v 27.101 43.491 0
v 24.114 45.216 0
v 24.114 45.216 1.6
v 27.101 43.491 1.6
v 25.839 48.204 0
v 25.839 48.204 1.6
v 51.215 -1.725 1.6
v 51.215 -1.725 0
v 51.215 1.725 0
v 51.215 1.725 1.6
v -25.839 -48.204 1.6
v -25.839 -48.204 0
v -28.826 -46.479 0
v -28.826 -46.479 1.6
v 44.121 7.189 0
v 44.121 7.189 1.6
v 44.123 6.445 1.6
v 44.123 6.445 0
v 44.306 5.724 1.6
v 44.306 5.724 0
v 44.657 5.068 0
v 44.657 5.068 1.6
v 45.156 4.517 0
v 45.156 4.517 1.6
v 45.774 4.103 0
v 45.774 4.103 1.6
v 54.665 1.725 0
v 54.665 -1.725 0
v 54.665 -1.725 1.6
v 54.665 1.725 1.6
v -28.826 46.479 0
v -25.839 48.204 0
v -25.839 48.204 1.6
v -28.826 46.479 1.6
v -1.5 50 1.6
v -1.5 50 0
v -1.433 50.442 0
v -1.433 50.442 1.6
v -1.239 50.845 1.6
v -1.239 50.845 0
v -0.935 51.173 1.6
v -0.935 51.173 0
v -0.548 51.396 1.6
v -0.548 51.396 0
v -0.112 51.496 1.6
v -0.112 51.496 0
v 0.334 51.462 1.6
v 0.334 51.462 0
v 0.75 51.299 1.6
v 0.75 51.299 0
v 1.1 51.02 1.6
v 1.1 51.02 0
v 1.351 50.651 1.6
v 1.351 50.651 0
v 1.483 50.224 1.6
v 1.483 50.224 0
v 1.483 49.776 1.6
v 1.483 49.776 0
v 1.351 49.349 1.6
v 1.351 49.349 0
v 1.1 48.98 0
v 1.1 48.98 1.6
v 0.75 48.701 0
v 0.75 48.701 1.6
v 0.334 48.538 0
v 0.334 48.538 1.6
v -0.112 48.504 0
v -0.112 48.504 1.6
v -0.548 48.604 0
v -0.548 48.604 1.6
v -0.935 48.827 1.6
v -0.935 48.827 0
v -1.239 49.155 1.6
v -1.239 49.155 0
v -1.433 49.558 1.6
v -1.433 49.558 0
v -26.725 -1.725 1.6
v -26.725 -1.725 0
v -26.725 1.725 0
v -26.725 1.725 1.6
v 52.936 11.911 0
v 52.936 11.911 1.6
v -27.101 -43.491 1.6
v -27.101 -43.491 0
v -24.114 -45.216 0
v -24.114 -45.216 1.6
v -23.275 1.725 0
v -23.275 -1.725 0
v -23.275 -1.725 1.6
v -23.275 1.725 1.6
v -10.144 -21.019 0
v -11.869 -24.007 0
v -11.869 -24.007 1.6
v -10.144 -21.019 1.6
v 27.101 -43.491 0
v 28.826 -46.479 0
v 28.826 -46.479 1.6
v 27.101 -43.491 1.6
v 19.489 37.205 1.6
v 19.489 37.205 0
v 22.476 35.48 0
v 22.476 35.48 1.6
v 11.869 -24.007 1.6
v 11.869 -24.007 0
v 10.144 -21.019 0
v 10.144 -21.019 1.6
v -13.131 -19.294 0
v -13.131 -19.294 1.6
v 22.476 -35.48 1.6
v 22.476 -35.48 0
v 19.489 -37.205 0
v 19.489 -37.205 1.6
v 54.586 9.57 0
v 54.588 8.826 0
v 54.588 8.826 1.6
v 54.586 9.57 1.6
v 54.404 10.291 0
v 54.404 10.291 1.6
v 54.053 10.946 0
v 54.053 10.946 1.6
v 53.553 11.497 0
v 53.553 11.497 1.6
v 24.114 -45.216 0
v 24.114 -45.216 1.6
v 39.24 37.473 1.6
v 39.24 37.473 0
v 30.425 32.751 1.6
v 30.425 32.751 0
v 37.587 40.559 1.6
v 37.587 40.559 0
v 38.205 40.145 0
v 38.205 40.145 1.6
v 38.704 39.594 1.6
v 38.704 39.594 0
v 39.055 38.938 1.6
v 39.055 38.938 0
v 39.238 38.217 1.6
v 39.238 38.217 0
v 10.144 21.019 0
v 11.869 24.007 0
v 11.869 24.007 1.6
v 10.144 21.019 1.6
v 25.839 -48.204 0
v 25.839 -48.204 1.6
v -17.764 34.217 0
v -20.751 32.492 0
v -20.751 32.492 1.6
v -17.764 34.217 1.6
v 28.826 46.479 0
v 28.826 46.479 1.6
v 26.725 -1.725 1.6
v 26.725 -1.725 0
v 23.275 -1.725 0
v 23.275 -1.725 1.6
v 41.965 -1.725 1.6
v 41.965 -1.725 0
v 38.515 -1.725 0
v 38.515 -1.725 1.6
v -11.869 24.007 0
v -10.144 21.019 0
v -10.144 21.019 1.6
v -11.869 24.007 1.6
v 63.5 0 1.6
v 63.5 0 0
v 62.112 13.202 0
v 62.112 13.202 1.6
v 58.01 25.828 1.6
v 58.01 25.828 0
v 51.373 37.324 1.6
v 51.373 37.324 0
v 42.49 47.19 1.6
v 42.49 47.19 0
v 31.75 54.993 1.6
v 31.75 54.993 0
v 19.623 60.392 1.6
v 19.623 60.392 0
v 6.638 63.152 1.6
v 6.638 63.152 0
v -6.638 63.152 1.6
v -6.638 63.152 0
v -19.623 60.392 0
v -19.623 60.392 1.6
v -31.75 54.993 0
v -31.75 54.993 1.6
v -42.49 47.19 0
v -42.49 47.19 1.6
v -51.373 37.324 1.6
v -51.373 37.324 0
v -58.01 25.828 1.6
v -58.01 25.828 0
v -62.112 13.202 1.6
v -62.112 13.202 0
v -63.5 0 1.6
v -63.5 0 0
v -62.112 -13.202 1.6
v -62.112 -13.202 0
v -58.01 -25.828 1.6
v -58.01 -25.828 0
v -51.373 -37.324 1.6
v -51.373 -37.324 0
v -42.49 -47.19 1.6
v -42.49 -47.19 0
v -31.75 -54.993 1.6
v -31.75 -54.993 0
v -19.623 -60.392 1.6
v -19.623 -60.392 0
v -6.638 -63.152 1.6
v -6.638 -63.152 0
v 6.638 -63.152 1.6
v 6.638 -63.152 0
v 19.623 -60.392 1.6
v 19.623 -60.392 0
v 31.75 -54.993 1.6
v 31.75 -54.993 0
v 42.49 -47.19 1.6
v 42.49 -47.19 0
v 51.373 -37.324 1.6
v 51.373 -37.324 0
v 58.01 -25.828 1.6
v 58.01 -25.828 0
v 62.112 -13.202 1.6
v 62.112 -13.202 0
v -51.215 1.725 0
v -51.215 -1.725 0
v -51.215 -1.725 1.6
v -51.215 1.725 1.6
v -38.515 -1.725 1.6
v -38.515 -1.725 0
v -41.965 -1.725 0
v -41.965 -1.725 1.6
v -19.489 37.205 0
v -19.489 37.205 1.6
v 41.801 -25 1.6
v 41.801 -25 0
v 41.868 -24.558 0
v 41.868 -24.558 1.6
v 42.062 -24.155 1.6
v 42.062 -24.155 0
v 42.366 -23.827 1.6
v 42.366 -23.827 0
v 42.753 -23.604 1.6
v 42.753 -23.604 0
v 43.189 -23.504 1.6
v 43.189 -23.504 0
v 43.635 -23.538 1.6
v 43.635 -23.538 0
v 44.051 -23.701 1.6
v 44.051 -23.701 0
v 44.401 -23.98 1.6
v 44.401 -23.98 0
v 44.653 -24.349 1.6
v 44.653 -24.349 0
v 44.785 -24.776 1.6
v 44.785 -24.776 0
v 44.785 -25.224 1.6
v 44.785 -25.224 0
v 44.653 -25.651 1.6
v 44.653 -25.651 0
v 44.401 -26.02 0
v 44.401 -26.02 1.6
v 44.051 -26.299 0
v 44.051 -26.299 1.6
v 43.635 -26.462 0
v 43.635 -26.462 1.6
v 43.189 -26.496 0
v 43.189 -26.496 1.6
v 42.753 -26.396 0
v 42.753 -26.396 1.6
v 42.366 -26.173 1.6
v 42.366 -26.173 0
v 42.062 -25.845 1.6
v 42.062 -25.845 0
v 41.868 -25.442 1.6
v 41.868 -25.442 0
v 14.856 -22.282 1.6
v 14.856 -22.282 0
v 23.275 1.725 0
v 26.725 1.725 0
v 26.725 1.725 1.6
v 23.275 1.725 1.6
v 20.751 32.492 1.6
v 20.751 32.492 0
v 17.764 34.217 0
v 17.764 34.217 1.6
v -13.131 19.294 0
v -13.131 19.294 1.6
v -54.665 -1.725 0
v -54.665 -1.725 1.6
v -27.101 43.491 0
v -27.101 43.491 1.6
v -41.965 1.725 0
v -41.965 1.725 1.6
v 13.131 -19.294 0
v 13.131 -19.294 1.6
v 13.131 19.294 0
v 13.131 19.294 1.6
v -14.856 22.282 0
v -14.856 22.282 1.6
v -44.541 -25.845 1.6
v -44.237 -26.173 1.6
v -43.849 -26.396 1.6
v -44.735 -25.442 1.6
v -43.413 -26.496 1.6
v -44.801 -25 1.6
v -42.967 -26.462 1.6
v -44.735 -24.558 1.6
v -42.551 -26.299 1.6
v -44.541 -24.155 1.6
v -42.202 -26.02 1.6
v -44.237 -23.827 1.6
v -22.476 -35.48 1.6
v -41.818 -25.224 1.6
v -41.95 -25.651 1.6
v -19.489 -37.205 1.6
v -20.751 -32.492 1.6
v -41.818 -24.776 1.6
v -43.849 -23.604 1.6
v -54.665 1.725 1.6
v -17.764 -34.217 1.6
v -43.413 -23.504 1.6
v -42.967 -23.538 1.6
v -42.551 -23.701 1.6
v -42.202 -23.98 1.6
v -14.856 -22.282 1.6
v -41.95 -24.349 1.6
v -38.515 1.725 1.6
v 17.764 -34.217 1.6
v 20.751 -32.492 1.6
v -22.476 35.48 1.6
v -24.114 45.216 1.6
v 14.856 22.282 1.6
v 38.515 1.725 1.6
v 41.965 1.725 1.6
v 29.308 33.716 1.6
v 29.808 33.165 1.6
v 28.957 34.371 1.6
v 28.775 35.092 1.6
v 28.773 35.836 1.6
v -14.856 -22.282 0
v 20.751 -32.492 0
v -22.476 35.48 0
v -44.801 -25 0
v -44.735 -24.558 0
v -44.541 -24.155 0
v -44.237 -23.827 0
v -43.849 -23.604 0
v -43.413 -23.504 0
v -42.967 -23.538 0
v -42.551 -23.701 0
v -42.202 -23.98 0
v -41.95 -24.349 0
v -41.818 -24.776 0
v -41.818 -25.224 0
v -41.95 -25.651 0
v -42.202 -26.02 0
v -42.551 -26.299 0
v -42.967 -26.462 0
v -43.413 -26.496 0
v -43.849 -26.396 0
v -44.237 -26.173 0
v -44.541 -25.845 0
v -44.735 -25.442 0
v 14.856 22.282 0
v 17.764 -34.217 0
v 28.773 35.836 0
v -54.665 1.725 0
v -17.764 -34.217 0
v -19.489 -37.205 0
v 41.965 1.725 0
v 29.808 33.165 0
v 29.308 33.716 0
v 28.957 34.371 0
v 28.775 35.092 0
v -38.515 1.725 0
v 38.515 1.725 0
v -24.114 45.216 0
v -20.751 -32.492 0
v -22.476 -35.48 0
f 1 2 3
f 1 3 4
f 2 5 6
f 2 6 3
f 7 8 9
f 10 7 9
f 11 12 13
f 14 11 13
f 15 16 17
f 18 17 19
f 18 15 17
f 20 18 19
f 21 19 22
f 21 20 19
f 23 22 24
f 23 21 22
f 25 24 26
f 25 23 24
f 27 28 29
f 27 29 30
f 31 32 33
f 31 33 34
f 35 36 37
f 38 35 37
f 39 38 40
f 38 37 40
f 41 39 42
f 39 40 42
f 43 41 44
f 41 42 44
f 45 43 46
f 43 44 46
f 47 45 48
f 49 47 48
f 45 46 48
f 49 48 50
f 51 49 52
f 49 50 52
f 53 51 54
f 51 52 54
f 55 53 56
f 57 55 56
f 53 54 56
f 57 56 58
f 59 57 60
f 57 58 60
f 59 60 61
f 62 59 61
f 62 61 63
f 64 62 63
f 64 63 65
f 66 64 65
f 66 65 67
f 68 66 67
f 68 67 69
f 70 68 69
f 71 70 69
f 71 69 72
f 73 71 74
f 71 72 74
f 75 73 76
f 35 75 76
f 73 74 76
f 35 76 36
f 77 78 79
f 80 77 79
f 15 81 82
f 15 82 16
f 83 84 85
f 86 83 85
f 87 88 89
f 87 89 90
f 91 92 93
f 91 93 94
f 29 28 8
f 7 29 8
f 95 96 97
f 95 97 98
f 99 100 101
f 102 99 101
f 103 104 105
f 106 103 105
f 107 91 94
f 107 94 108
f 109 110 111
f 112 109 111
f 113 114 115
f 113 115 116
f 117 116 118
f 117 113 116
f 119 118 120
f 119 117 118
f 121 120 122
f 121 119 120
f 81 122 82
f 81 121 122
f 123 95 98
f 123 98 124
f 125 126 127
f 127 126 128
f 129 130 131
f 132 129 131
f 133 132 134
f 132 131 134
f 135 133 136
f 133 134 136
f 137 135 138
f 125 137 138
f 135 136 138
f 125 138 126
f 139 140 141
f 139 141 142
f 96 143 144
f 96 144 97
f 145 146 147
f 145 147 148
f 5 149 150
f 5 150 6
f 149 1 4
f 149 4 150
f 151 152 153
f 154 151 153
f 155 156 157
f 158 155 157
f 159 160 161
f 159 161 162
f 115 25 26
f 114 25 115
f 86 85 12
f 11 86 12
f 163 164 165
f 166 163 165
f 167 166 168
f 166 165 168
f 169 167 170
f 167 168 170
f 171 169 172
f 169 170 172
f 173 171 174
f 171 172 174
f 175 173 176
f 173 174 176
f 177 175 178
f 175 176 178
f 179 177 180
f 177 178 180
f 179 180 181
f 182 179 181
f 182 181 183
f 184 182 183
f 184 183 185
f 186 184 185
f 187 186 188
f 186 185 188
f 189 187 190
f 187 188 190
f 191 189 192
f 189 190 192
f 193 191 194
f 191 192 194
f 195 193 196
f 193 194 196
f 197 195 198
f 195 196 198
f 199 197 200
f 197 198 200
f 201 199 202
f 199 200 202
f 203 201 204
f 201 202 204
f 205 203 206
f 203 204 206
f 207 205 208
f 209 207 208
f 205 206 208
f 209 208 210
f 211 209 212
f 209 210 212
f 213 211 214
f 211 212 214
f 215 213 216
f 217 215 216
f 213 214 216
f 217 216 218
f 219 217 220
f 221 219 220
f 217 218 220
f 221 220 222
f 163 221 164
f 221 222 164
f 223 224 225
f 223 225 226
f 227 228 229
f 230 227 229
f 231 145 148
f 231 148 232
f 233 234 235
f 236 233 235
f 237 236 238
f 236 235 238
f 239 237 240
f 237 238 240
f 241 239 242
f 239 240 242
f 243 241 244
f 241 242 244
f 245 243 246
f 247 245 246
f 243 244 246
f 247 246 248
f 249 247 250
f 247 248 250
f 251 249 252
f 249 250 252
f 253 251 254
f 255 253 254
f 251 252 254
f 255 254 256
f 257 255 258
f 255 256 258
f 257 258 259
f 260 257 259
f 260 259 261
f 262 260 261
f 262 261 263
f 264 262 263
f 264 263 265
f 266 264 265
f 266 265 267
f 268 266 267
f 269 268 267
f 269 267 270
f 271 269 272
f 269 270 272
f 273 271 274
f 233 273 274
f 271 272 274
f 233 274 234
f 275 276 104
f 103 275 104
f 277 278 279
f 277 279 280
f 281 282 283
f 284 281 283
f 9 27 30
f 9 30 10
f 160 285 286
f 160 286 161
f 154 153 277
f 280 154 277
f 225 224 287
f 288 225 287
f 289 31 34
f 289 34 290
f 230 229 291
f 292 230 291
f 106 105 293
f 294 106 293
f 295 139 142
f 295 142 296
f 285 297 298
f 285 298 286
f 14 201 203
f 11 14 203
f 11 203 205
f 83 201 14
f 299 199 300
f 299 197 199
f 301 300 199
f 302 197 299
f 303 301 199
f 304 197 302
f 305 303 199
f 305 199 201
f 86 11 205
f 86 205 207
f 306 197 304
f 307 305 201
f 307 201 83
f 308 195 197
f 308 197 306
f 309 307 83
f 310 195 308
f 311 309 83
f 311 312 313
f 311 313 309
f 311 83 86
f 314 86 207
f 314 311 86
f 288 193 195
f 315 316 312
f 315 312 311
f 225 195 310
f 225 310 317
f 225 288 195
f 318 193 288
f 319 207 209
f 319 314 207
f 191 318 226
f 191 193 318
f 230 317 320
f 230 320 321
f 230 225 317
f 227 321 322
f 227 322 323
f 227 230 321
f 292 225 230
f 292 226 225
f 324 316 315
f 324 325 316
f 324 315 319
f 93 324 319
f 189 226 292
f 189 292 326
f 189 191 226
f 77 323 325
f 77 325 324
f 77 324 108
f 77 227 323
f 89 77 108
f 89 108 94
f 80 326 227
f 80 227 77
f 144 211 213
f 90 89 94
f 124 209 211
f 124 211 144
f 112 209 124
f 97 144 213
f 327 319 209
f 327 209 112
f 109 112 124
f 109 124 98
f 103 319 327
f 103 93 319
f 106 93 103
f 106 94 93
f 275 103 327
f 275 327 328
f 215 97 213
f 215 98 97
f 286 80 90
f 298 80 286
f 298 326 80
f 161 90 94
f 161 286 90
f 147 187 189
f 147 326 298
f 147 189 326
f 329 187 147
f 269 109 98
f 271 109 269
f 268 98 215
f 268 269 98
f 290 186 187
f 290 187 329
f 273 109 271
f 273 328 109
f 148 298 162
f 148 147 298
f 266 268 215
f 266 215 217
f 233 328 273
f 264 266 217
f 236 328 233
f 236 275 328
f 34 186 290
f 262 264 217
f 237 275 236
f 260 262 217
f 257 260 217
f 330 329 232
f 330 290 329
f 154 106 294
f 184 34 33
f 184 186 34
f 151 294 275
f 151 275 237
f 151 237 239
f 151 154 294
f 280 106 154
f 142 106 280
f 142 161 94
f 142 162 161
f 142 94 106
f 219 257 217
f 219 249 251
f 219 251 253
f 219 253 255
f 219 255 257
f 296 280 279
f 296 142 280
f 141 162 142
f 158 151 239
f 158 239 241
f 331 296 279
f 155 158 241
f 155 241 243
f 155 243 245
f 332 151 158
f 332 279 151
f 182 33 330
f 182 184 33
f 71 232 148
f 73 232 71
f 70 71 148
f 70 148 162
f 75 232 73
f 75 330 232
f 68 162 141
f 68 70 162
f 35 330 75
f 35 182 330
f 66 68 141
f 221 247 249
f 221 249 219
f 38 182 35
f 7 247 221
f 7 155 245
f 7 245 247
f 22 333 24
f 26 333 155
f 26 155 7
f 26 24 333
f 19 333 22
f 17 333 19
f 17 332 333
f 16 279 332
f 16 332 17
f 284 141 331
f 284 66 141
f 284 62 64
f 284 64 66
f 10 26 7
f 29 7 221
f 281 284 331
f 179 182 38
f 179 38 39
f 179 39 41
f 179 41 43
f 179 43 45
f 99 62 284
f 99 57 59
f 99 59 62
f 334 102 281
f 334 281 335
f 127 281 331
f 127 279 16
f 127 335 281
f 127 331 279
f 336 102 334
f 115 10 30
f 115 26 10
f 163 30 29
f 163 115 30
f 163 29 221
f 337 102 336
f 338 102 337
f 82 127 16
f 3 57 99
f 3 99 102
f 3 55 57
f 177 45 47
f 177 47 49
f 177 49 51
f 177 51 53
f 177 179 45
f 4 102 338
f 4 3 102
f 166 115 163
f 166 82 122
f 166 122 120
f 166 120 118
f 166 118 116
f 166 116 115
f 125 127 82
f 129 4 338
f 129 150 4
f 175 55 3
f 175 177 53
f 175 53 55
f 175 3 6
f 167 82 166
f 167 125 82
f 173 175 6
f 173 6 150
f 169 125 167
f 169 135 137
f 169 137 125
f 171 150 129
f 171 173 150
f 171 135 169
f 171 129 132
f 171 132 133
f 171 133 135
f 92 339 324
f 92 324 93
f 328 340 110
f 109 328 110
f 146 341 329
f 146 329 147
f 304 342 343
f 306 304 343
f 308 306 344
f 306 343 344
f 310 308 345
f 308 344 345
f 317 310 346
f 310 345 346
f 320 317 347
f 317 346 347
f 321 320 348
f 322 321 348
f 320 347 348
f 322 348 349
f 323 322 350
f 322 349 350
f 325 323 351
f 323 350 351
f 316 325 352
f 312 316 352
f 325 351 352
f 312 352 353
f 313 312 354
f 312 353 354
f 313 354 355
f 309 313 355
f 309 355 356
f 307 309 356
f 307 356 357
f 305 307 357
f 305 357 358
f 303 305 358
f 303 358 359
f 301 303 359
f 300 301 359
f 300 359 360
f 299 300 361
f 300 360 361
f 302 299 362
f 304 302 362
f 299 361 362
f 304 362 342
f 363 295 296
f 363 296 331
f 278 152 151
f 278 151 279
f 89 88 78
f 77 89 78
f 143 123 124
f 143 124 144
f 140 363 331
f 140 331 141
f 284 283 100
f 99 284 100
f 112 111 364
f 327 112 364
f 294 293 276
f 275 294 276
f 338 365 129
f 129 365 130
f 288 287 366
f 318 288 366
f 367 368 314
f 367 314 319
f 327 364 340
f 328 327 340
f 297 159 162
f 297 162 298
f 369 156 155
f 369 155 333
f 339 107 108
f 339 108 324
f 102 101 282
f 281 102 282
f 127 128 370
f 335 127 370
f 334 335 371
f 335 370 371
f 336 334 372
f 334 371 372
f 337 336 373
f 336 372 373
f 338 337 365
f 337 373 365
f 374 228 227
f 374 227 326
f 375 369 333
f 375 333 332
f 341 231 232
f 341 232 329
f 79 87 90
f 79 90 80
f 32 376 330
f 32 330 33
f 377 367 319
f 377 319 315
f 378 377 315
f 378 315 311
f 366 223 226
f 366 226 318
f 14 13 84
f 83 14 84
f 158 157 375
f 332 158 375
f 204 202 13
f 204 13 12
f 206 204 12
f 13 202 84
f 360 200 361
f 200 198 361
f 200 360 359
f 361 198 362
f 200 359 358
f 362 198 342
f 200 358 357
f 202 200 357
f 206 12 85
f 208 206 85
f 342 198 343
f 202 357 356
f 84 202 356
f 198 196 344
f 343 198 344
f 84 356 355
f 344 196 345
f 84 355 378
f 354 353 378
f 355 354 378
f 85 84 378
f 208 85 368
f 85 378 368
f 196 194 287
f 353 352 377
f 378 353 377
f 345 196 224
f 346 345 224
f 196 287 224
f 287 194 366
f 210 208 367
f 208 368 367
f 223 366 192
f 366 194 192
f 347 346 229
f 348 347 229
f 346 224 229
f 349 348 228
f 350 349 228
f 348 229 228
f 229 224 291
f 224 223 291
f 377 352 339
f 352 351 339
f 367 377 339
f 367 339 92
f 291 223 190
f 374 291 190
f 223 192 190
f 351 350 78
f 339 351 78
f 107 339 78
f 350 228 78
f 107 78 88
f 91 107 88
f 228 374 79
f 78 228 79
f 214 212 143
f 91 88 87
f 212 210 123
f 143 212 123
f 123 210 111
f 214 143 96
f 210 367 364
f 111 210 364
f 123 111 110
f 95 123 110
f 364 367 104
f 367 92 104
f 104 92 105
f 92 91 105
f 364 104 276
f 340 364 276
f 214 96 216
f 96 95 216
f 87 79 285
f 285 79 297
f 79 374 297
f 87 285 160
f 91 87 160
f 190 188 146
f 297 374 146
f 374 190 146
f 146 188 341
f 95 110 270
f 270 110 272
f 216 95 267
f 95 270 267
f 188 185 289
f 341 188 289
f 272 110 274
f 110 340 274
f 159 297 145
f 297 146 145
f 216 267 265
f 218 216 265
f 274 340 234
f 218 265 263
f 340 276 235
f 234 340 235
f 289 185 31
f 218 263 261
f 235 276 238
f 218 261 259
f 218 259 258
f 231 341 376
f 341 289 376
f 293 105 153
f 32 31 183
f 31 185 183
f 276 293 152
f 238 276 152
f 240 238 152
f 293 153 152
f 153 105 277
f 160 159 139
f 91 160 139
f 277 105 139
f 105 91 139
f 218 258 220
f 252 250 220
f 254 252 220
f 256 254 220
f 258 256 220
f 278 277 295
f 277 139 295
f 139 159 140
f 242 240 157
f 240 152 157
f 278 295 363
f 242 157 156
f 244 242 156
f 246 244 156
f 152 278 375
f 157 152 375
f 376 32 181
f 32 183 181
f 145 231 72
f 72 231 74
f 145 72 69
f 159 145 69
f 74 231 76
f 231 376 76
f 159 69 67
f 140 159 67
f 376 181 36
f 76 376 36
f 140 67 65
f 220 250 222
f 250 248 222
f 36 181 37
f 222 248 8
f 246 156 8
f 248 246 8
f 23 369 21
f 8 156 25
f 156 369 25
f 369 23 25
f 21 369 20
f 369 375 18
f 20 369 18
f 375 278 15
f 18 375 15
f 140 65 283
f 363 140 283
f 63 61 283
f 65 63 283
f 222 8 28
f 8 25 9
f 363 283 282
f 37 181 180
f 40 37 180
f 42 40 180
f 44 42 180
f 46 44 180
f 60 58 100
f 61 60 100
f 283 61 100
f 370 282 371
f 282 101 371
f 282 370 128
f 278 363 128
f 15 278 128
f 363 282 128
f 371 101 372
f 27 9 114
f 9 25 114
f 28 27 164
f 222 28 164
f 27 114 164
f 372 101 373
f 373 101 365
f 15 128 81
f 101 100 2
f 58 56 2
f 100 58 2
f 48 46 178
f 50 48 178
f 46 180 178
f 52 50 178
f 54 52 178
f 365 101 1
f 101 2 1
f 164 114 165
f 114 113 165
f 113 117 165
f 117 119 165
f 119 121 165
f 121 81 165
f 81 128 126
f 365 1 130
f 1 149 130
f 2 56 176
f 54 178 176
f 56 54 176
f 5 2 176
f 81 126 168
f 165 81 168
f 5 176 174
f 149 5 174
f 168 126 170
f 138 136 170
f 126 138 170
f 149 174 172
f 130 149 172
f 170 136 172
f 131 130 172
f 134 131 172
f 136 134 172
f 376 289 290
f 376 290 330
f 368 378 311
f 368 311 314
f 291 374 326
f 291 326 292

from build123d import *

# Parameters (mm, degrees)
SKETCH1_R           = 63.5
BOSS_EXTRUDE1_DEPTH = 1.6
SKETCH3_R           = 1.75
CUT_EXTRUDE4_DEPTH  = 1.6
SKETCH2_R           = 1.5
CUT_EXTRUDE5_DEPTH  = 1.6
CUT_EXTRUDE6_DEPTH  = 10
SKETCH5_W           = 3.45
SKETCH5_H           = 3.45
CUT_EXTRUDE7_DEPTH  = 10


with BuildPart() as part:
    # Sketch1 → Boss-Extrude1 (new body)
    with BuildSketch(Plane.XY):
        Circle(SKETCH1_R)
    extrude(amount=BOSS_EXTRUDE1_DEPTH)

    # Sketch3 → Cut-Extrude4 (cut)
    with BuildSketch(Plane(origin=(0, 0, 0), x_dir=(-1, 0, 0), z_dir=(0, 0, -1))):
        with Locations((-34.006305458, 36.654756705)):
            Circle(SKETCH3_R)
        with Locations((-49.354669589, 8.007283544)):
            Circle(SKETCH3_R)
    extrude(amount=-CUT_EXTRUDE4_DEPTH, mode=Mode.SUBTRACT)

    # Sketch2 → Cut-Extrude5 (cut)
    with BuildSketch(Plane(origin=(0, 0, 0), x_dir=(-1, 0, 0), z_dir=(0, 0, -1))):
        with Locations((0, 50)):
            Circle(SKETCH2_R)
        with Locations((43.301270189, -25)):
            Circle(SKETCH2_R)
        with Locations((-43.301270189, -25)):
            Circle(SKETCH2_R)
    extrude(amount=-CUT_EXTRUDE5_DEPTH, mode=Mode.SUBTRACT)

    # Sketch4 → Cut-Extrude6 (cut)
    with BuildSketch(Plane(origin=(0, 0, 0), x_dir=(-1, 0, 0), z_dir=(0, 0, -1))):
        with BuildLine():
            Line((-52.935522776, 11.911126581), (-44.12091565, 7.188553002))
            ThreePointArc((-44.12091565, 7.188553002), (-44.461118004, 5.385481223), (-45.773816402, 4.103440508))
            Line((-45.773816402, 4.103440508), (-54.588423529, 8.826014086))
            ThreePointArc((-54.588423529, 8.826014086), (-54.248221174, 10.629085865), (-52.935522776, 11.911126581))
        make_face()
        with BuildLine():
            Line((-39.240059397, 37.473487247), (-30.425452271, 32.750913668))
            ThreePointArc((-30.425452271, 32.750913668), (-29.112753873, 34.032954384), (-28.772551518, 35.836026163))
            Line((-28.772551518, 35.836026163), (-37.587158645, 40.558599742))
            ThreePointArc((-37.587158645, 40.558599742), (-38.899857043, 39.276559026), (-39.240059397, 37.473487247))
        make_face()
    extrude(amount=-CUT_EXTRUDE6_DEPTH, mode=Mode.SUBTRACT)

    # Sketch5 → Cut-Extrude7 (cut)
    with BuildSketch(Plane(origin=(0, 0, 0), x_dir=(-1, 0, 0), z_dir=(0, 0, -1))):
        with Locations((-52.94, 0)):
            Rectangle(SKETCH5_W, SKETCH5_H)
        Polygon((-24.113606178, -45.215991055), (-25.838606178, -48.203778698), (-28.826393822, -46.478778698), (-27.101393822, -43.490991055), align=None)
        Polygon((-27.101393822, 43.490991055), (-28.826393822, 46.478778698), (-25.838606178, 48.203778698), (-24.113606178, 45.215991055), align=None)
        with Locations((-40.24, 0)):
            Rectangle(SKETCH5_W, SKETCH5_H)
        with Locations((-25, 0)):
            Rectangle(SKETCH5_W, SKETCH5_H)
        with Locations((25, 0)):
            Rectangle(SKETCH5_W, SKETCH5_H)
        with Locations((40.24, 0)):
            Rectangle(SKETCH5_W, SKETCH5_H)
        with Locations((52.94, 0)):
            Rectangle(SKETCH5_W, SKETCH5_H)
        Polygon((13.131393822, -19.294241273), (14.856393822, -22.282028916), (11.868606178, -24.007028916), (10.143606178, -21.019241273), align=None)
        Polygon((20.751393822, -32.492468427), (22.476393822, -35.48025607), (19.488606178, -37.20525607), (17.763606178, -34.217468427), align=None)
        Polygon((24.113606178, -45.215991055), (25.838606178, -48.203778698), (28.826393822, -46.478778698), (27.101393822, -43.490991055), align=None)
        Polygon((-13.131393822, -19.294241273), (-14.856393822, -22.282028916), (-11.868606178, -24.007028916), (-10.143606178, -21.019241273), align=None)
        Polygon((-20.751393822, -32.492468427), (-22.476393822, -35.48025607), (-19.488606178, -37.20525607), (-17.763606178, -34.217468427), align=None)
        Polygon((-17.763606178, 34.217468427), (-19.488606178, 37.20525607), (-22.476393822, 35.48025607), (-20.751393822, 32.492468427), align=None)
        Polygon((-13.131393822, 19.294241273), (-14.856393822, 22.282028916), (-11.868606178, 24.007028916), (-10.143606178, 21.019241273), align=None)
        Polygon((10.143606178, 21.019241273), (11.868606178, 24.007028916), (14.856393822, 22.282028916), (13.131393822, 19.294241273), align=None)
        Polygon((17.763606178, 34.217468427), (19.488606178, 37.20525607), (22.476393822, 35.48025607), (20.751393822, 32.492468427), align=None)
        Polygon((24.113606178, 45.215991055), (25.838606178, 48.203778698), (28.826393822, 46.478778698), (27.101393822, 43.490991055), align=None)
    extrude(amount=-CUT_EXTRUDE7_DEPTH, mode=Mode.SUBTRACT)


solid = part.part
